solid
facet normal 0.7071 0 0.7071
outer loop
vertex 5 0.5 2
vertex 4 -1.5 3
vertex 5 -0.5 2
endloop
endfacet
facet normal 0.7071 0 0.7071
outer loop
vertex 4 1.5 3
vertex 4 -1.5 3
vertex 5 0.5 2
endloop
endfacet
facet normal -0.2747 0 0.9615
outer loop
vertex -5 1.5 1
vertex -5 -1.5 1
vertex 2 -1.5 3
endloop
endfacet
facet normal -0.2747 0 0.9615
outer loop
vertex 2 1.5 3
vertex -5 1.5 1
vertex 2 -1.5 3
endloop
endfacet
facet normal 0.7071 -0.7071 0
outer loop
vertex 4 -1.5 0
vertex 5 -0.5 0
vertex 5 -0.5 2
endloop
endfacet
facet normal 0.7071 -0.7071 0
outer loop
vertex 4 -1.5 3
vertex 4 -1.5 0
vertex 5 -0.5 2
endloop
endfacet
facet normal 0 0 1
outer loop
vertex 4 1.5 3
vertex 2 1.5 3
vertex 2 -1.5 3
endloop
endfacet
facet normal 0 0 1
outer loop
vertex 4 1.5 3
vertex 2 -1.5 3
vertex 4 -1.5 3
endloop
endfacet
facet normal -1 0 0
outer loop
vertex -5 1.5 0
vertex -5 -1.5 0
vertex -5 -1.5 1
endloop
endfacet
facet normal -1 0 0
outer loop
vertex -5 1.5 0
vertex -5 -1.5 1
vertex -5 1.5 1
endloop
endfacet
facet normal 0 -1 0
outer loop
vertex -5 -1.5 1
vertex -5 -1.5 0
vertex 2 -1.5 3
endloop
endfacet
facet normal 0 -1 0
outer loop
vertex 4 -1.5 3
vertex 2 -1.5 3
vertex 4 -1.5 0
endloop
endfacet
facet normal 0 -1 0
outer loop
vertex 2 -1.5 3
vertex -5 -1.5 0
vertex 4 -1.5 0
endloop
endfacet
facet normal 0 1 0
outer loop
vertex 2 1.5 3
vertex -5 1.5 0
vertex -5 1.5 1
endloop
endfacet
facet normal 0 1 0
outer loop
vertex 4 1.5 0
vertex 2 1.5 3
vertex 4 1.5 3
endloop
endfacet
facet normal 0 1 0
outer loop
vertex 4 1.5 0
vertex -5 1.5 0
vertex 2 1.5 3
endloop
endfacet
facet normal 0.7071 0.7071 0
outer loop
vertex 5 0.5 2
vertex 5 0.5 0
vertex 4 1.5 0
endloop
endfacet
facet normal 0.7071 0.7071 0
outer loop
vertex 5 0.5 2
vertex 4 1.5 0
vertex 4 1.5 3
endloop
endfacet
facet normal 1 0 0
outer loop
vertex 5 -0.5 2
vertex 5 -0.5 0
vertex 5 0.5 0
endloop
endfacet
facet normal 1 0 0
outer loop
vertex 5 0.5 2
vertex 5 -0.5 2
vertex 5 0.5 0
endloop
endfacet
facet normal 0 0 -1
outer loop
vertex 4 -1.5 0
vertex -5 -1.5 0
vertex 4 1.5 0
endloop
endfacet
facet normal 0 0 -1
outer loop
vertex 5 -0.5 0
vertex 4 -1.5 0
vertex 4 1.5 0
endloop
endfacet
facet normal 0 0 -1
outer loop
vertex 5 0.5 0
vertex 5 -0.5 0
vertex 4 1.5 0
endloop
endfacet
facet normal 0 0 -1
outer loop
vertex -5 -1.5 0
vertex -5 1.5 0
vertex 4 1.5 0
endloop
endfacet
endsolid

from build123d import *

# Parameters (mm, degrees)
F0_W     = 10
F0_H     = 3
F1_DEPTH = 3
F3_DEPTH = 25
F4_SIZE  = 1


with BuildPart() as f1:
    # F0 (on Top) → F1 (new body)
    with BuildSketch(Plane.XY):
        Rectangle(F0_W, F0_H)
    extrude(amount=F1_DEPTH)

    # F2 (on face) → F3 (cut)
    with BuildSketch(Plane.XZ.offset(1.5)):
        Polygon((-5, 3), (-5, 1), (2, 3), align=None)
    extrude(amount=-F3_DEPTH, mode=Mode.SUBTRACT)

    # F4
    f4_edges = [f1.edges().sort_by_distance(p)[0] for p in [
        (5, 0, 3),
        (5, -1.5, 1.5),
        (5, 1.5, 1.5),
    ]]
    chamfer(f4_edges, length=F4_SIZE)


solid = f1.part
